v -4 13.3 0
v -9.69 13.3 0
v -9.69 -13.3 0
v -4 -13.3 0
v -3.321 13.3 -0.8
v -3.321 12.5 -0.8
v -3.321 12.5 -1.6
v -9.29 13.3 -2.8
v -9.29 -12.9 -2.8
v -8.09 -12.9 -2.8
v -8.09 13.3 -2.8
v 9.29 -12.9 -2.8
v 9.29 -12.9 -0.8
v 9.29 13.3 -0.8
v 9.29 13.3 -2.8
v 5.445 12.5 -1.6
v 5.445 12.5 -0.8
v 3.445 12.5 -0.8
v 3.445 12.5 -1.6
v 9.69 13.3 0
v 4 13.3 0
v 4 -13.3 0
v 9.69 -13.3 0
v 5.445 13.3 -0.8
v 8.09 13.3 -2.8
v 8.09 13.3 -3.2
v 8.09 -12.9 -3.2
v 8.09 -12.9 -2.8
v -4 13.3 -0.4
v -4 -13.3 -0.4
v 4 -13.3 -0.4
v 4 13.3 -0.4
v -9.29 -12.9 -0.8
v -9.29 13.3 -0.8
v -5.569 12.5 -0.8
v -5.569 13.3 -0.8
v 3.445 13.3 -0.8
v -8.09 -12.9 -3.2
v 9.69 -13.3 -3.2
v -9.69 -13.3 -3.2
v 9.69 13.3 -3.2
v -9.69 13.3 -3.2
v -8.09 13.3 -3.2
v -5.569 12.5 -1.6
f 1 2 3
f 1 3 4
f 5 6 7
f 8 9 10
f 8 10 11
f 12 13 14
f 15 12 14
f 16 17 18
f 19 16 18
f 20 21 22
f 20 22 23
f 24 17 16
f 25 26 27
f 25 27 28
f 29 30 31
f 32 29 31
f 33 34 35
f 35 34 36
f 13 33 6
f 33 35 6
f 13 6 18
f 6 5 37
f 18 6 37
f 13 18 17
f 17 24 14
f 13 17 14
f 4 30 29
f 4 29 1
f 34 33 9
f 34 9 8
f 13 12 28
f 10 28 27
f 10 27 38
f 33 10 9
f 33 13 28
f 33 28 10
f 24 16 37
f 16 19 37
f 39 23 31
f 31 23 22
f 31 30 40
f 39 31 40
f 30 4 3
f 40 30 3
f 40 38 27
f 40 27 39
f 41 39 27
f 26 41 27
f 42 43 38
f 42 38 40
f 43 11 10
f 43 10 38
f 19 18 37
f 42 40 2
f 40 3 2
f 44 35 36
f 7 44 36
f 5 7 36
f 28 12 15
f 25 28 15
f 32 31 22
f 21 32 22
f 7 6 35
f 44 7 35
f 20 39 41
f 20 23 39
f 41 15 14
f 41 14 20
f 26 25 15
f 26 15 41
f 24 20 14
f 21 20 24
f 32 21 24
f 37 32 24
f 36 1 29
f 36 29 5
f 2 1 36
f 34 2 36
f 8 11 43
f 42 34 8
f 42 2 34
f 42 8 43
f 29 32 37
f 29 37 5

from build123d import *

# Parameters (mm, degrees)
SKETCH1_W           = 19.38
SKETCH1_H           = 26.6
BOSS_EXTRUDE1_DEPTH = 0.8
SKETCH2_W           = 0.4
SKETCH2_H           = 26.6
BOSS_EXTRUDE2_DEPTH = 2.4
SKETCH3_W           = 0.4
SKETCH3_H           = 26.6
BOSS_EXTRUDE3_DEPTH = 2.4
SKETCH4_W           = 8
SKETCH4_H           = 0.4
CUT_EXTRUDE1_DEPTH  = 27.6
SKETCH5_W           = 0.4
SKETCH5_H           = 26.6
BOSS_EXTRUDE4_DEPTH = 1.2
SKETCH6_W           = 0.4
SKETCH6_H           = 26.6
BOSS_EXTRUDE5_DEPTH = 1.2
SKETCH7_W           = 18.58
SKETCH7_H           = 0.4
BOSS_EXTRUDE6_DEPTH = 2.4
SKETCH8_W           = 2
SKETCH8_H           = 0.8
BOSS_EXTRUDE7_DEPTH = 0.8
SKETCH9_W           = 2.2470594
SKETCH9_H           = 0.8
BOSS_EXTRUDE8_DEPTH = 0.8
CUT_EXTRUDE2_DEPTH  = 11.01353


with BuildPart() as part:
    # Sketch1 → Boss-Extrude1 (new body)
    with BuildSketch(Plane.XY):
        Rectangle(SKETCH1_W, SKETCH1_H)
    extrude(amount=-BOSS_EXTRUDE1_DEPTH)

    # Sketch2 → Boss-Extrude2 (add)
    with BuildSketch(Plane(origin=(0, 0, -0.8), x_dir=(-1, 0, 0), z_dir=(0, 0, -1))):
        with Locations((-9.49, 0)):
            Rectangle(SKETCH2_W, SKETCH2_H)
    extrude(amount=BOSS_EXTRUDE2_DEPTH)

    # Sketch3 → Boss-Extrude3 (add)
    with BuildSketch(Plane(origin=(0, 0, -0.8), x_dir=(-1, 0, 0), z_dir=(0, 0, -1))):
        with Locations((9.49, 0)):
            Rectangle(SKETCH3_W, SKETCH3_H)
    extrude(amount=BOSS_EXTRUDE3_DEPTH)

    # Sketch4 → Cut-Extrude1 (cut, through all)
    with BuildSketch(Plane.XZ.offset(13.3)):
        with Locations((0, -0.2)):
            Rectangle(SKETCH4_W, SKETCH4_H)
    extrude(amount=-CUT_EXTRUDE1_DEPTH, mode=Mode.SUBTRACT)

    # Sketch5 → Boss-Extrude4 (add)
    with BuildSketch(Plane.ZY.offset(-9.29)):
        with Locations((-3, 0)):
            Rectangle(SKETCH5_W, SKETCH5_H)
    extrude(amount=BOSS_EXTRUDE4_DEPTH)

    # Sketch6 → Boss-Extrude5 (add)
    with BuildSketch(Plane(origin=(-9.29, 0, 0), x_dir=(0, 0, -1), z_dir=(1, 0, 0))):
        with Locations((3, 0)):
            Rectangle(SKETCH6_W, SKETCH6_H)
    extrude(amount=BOSS_EXTRUDE5_DEPTH)

    # Sketch7 → Boss-Extrude6 (add, through all)
    with BuildSketch(Plane(origin=(0, 0, -0.8), x_dir=(-1, 0, 0), z_dir=(0, 0, -1))):
        with Locations((0, -13.1)):
            Rectangle(SKETCH7_W, SKETCH7_H)
    extrude(amount=BOSS_EXTRUDE6_DEPTH)

    # Sketch8 → Boss-Extrude7 (add)
    with BuildSketch(Plane(origin=(0, 0, -0.8), x_dir=(-1, 0, 0), z_dir=(0, 0, -1))):
        with Locations((-4.445, 12.9)):
            Rectangle(SKETCH8_W, SKETCH8_H)
    extrude(amount=BOSS_EXTRUDE7_DEPTH)

    # Sketch9 → Boss-Extrude8 (add)
    with BuildSketch(Plane(origin=(0, 0, -0.8), x_dir=(-1, 0, 0), z_dir=(0, 0, -1))):
        with Locations((4.445, 12.9)):
            Rectangle(SKETCH9_W, SKETCH9_H)
    extrude(amount=BOSS_EXTRUDE8_DEPTH)

    # Sketch10 → Cut-Extrude2 (cut)
    with BuildSketch(Plane.ZY.offset(5.5685297)):
        Polygon((-1.6, 12.5), (-0.8, 13.3), (-1.6, 13.3), align=None)
    extrude(amount=-CUT_EXTRUDE2_DEPTH, mode=Mode.SUBTRACT)


solid = part.part
